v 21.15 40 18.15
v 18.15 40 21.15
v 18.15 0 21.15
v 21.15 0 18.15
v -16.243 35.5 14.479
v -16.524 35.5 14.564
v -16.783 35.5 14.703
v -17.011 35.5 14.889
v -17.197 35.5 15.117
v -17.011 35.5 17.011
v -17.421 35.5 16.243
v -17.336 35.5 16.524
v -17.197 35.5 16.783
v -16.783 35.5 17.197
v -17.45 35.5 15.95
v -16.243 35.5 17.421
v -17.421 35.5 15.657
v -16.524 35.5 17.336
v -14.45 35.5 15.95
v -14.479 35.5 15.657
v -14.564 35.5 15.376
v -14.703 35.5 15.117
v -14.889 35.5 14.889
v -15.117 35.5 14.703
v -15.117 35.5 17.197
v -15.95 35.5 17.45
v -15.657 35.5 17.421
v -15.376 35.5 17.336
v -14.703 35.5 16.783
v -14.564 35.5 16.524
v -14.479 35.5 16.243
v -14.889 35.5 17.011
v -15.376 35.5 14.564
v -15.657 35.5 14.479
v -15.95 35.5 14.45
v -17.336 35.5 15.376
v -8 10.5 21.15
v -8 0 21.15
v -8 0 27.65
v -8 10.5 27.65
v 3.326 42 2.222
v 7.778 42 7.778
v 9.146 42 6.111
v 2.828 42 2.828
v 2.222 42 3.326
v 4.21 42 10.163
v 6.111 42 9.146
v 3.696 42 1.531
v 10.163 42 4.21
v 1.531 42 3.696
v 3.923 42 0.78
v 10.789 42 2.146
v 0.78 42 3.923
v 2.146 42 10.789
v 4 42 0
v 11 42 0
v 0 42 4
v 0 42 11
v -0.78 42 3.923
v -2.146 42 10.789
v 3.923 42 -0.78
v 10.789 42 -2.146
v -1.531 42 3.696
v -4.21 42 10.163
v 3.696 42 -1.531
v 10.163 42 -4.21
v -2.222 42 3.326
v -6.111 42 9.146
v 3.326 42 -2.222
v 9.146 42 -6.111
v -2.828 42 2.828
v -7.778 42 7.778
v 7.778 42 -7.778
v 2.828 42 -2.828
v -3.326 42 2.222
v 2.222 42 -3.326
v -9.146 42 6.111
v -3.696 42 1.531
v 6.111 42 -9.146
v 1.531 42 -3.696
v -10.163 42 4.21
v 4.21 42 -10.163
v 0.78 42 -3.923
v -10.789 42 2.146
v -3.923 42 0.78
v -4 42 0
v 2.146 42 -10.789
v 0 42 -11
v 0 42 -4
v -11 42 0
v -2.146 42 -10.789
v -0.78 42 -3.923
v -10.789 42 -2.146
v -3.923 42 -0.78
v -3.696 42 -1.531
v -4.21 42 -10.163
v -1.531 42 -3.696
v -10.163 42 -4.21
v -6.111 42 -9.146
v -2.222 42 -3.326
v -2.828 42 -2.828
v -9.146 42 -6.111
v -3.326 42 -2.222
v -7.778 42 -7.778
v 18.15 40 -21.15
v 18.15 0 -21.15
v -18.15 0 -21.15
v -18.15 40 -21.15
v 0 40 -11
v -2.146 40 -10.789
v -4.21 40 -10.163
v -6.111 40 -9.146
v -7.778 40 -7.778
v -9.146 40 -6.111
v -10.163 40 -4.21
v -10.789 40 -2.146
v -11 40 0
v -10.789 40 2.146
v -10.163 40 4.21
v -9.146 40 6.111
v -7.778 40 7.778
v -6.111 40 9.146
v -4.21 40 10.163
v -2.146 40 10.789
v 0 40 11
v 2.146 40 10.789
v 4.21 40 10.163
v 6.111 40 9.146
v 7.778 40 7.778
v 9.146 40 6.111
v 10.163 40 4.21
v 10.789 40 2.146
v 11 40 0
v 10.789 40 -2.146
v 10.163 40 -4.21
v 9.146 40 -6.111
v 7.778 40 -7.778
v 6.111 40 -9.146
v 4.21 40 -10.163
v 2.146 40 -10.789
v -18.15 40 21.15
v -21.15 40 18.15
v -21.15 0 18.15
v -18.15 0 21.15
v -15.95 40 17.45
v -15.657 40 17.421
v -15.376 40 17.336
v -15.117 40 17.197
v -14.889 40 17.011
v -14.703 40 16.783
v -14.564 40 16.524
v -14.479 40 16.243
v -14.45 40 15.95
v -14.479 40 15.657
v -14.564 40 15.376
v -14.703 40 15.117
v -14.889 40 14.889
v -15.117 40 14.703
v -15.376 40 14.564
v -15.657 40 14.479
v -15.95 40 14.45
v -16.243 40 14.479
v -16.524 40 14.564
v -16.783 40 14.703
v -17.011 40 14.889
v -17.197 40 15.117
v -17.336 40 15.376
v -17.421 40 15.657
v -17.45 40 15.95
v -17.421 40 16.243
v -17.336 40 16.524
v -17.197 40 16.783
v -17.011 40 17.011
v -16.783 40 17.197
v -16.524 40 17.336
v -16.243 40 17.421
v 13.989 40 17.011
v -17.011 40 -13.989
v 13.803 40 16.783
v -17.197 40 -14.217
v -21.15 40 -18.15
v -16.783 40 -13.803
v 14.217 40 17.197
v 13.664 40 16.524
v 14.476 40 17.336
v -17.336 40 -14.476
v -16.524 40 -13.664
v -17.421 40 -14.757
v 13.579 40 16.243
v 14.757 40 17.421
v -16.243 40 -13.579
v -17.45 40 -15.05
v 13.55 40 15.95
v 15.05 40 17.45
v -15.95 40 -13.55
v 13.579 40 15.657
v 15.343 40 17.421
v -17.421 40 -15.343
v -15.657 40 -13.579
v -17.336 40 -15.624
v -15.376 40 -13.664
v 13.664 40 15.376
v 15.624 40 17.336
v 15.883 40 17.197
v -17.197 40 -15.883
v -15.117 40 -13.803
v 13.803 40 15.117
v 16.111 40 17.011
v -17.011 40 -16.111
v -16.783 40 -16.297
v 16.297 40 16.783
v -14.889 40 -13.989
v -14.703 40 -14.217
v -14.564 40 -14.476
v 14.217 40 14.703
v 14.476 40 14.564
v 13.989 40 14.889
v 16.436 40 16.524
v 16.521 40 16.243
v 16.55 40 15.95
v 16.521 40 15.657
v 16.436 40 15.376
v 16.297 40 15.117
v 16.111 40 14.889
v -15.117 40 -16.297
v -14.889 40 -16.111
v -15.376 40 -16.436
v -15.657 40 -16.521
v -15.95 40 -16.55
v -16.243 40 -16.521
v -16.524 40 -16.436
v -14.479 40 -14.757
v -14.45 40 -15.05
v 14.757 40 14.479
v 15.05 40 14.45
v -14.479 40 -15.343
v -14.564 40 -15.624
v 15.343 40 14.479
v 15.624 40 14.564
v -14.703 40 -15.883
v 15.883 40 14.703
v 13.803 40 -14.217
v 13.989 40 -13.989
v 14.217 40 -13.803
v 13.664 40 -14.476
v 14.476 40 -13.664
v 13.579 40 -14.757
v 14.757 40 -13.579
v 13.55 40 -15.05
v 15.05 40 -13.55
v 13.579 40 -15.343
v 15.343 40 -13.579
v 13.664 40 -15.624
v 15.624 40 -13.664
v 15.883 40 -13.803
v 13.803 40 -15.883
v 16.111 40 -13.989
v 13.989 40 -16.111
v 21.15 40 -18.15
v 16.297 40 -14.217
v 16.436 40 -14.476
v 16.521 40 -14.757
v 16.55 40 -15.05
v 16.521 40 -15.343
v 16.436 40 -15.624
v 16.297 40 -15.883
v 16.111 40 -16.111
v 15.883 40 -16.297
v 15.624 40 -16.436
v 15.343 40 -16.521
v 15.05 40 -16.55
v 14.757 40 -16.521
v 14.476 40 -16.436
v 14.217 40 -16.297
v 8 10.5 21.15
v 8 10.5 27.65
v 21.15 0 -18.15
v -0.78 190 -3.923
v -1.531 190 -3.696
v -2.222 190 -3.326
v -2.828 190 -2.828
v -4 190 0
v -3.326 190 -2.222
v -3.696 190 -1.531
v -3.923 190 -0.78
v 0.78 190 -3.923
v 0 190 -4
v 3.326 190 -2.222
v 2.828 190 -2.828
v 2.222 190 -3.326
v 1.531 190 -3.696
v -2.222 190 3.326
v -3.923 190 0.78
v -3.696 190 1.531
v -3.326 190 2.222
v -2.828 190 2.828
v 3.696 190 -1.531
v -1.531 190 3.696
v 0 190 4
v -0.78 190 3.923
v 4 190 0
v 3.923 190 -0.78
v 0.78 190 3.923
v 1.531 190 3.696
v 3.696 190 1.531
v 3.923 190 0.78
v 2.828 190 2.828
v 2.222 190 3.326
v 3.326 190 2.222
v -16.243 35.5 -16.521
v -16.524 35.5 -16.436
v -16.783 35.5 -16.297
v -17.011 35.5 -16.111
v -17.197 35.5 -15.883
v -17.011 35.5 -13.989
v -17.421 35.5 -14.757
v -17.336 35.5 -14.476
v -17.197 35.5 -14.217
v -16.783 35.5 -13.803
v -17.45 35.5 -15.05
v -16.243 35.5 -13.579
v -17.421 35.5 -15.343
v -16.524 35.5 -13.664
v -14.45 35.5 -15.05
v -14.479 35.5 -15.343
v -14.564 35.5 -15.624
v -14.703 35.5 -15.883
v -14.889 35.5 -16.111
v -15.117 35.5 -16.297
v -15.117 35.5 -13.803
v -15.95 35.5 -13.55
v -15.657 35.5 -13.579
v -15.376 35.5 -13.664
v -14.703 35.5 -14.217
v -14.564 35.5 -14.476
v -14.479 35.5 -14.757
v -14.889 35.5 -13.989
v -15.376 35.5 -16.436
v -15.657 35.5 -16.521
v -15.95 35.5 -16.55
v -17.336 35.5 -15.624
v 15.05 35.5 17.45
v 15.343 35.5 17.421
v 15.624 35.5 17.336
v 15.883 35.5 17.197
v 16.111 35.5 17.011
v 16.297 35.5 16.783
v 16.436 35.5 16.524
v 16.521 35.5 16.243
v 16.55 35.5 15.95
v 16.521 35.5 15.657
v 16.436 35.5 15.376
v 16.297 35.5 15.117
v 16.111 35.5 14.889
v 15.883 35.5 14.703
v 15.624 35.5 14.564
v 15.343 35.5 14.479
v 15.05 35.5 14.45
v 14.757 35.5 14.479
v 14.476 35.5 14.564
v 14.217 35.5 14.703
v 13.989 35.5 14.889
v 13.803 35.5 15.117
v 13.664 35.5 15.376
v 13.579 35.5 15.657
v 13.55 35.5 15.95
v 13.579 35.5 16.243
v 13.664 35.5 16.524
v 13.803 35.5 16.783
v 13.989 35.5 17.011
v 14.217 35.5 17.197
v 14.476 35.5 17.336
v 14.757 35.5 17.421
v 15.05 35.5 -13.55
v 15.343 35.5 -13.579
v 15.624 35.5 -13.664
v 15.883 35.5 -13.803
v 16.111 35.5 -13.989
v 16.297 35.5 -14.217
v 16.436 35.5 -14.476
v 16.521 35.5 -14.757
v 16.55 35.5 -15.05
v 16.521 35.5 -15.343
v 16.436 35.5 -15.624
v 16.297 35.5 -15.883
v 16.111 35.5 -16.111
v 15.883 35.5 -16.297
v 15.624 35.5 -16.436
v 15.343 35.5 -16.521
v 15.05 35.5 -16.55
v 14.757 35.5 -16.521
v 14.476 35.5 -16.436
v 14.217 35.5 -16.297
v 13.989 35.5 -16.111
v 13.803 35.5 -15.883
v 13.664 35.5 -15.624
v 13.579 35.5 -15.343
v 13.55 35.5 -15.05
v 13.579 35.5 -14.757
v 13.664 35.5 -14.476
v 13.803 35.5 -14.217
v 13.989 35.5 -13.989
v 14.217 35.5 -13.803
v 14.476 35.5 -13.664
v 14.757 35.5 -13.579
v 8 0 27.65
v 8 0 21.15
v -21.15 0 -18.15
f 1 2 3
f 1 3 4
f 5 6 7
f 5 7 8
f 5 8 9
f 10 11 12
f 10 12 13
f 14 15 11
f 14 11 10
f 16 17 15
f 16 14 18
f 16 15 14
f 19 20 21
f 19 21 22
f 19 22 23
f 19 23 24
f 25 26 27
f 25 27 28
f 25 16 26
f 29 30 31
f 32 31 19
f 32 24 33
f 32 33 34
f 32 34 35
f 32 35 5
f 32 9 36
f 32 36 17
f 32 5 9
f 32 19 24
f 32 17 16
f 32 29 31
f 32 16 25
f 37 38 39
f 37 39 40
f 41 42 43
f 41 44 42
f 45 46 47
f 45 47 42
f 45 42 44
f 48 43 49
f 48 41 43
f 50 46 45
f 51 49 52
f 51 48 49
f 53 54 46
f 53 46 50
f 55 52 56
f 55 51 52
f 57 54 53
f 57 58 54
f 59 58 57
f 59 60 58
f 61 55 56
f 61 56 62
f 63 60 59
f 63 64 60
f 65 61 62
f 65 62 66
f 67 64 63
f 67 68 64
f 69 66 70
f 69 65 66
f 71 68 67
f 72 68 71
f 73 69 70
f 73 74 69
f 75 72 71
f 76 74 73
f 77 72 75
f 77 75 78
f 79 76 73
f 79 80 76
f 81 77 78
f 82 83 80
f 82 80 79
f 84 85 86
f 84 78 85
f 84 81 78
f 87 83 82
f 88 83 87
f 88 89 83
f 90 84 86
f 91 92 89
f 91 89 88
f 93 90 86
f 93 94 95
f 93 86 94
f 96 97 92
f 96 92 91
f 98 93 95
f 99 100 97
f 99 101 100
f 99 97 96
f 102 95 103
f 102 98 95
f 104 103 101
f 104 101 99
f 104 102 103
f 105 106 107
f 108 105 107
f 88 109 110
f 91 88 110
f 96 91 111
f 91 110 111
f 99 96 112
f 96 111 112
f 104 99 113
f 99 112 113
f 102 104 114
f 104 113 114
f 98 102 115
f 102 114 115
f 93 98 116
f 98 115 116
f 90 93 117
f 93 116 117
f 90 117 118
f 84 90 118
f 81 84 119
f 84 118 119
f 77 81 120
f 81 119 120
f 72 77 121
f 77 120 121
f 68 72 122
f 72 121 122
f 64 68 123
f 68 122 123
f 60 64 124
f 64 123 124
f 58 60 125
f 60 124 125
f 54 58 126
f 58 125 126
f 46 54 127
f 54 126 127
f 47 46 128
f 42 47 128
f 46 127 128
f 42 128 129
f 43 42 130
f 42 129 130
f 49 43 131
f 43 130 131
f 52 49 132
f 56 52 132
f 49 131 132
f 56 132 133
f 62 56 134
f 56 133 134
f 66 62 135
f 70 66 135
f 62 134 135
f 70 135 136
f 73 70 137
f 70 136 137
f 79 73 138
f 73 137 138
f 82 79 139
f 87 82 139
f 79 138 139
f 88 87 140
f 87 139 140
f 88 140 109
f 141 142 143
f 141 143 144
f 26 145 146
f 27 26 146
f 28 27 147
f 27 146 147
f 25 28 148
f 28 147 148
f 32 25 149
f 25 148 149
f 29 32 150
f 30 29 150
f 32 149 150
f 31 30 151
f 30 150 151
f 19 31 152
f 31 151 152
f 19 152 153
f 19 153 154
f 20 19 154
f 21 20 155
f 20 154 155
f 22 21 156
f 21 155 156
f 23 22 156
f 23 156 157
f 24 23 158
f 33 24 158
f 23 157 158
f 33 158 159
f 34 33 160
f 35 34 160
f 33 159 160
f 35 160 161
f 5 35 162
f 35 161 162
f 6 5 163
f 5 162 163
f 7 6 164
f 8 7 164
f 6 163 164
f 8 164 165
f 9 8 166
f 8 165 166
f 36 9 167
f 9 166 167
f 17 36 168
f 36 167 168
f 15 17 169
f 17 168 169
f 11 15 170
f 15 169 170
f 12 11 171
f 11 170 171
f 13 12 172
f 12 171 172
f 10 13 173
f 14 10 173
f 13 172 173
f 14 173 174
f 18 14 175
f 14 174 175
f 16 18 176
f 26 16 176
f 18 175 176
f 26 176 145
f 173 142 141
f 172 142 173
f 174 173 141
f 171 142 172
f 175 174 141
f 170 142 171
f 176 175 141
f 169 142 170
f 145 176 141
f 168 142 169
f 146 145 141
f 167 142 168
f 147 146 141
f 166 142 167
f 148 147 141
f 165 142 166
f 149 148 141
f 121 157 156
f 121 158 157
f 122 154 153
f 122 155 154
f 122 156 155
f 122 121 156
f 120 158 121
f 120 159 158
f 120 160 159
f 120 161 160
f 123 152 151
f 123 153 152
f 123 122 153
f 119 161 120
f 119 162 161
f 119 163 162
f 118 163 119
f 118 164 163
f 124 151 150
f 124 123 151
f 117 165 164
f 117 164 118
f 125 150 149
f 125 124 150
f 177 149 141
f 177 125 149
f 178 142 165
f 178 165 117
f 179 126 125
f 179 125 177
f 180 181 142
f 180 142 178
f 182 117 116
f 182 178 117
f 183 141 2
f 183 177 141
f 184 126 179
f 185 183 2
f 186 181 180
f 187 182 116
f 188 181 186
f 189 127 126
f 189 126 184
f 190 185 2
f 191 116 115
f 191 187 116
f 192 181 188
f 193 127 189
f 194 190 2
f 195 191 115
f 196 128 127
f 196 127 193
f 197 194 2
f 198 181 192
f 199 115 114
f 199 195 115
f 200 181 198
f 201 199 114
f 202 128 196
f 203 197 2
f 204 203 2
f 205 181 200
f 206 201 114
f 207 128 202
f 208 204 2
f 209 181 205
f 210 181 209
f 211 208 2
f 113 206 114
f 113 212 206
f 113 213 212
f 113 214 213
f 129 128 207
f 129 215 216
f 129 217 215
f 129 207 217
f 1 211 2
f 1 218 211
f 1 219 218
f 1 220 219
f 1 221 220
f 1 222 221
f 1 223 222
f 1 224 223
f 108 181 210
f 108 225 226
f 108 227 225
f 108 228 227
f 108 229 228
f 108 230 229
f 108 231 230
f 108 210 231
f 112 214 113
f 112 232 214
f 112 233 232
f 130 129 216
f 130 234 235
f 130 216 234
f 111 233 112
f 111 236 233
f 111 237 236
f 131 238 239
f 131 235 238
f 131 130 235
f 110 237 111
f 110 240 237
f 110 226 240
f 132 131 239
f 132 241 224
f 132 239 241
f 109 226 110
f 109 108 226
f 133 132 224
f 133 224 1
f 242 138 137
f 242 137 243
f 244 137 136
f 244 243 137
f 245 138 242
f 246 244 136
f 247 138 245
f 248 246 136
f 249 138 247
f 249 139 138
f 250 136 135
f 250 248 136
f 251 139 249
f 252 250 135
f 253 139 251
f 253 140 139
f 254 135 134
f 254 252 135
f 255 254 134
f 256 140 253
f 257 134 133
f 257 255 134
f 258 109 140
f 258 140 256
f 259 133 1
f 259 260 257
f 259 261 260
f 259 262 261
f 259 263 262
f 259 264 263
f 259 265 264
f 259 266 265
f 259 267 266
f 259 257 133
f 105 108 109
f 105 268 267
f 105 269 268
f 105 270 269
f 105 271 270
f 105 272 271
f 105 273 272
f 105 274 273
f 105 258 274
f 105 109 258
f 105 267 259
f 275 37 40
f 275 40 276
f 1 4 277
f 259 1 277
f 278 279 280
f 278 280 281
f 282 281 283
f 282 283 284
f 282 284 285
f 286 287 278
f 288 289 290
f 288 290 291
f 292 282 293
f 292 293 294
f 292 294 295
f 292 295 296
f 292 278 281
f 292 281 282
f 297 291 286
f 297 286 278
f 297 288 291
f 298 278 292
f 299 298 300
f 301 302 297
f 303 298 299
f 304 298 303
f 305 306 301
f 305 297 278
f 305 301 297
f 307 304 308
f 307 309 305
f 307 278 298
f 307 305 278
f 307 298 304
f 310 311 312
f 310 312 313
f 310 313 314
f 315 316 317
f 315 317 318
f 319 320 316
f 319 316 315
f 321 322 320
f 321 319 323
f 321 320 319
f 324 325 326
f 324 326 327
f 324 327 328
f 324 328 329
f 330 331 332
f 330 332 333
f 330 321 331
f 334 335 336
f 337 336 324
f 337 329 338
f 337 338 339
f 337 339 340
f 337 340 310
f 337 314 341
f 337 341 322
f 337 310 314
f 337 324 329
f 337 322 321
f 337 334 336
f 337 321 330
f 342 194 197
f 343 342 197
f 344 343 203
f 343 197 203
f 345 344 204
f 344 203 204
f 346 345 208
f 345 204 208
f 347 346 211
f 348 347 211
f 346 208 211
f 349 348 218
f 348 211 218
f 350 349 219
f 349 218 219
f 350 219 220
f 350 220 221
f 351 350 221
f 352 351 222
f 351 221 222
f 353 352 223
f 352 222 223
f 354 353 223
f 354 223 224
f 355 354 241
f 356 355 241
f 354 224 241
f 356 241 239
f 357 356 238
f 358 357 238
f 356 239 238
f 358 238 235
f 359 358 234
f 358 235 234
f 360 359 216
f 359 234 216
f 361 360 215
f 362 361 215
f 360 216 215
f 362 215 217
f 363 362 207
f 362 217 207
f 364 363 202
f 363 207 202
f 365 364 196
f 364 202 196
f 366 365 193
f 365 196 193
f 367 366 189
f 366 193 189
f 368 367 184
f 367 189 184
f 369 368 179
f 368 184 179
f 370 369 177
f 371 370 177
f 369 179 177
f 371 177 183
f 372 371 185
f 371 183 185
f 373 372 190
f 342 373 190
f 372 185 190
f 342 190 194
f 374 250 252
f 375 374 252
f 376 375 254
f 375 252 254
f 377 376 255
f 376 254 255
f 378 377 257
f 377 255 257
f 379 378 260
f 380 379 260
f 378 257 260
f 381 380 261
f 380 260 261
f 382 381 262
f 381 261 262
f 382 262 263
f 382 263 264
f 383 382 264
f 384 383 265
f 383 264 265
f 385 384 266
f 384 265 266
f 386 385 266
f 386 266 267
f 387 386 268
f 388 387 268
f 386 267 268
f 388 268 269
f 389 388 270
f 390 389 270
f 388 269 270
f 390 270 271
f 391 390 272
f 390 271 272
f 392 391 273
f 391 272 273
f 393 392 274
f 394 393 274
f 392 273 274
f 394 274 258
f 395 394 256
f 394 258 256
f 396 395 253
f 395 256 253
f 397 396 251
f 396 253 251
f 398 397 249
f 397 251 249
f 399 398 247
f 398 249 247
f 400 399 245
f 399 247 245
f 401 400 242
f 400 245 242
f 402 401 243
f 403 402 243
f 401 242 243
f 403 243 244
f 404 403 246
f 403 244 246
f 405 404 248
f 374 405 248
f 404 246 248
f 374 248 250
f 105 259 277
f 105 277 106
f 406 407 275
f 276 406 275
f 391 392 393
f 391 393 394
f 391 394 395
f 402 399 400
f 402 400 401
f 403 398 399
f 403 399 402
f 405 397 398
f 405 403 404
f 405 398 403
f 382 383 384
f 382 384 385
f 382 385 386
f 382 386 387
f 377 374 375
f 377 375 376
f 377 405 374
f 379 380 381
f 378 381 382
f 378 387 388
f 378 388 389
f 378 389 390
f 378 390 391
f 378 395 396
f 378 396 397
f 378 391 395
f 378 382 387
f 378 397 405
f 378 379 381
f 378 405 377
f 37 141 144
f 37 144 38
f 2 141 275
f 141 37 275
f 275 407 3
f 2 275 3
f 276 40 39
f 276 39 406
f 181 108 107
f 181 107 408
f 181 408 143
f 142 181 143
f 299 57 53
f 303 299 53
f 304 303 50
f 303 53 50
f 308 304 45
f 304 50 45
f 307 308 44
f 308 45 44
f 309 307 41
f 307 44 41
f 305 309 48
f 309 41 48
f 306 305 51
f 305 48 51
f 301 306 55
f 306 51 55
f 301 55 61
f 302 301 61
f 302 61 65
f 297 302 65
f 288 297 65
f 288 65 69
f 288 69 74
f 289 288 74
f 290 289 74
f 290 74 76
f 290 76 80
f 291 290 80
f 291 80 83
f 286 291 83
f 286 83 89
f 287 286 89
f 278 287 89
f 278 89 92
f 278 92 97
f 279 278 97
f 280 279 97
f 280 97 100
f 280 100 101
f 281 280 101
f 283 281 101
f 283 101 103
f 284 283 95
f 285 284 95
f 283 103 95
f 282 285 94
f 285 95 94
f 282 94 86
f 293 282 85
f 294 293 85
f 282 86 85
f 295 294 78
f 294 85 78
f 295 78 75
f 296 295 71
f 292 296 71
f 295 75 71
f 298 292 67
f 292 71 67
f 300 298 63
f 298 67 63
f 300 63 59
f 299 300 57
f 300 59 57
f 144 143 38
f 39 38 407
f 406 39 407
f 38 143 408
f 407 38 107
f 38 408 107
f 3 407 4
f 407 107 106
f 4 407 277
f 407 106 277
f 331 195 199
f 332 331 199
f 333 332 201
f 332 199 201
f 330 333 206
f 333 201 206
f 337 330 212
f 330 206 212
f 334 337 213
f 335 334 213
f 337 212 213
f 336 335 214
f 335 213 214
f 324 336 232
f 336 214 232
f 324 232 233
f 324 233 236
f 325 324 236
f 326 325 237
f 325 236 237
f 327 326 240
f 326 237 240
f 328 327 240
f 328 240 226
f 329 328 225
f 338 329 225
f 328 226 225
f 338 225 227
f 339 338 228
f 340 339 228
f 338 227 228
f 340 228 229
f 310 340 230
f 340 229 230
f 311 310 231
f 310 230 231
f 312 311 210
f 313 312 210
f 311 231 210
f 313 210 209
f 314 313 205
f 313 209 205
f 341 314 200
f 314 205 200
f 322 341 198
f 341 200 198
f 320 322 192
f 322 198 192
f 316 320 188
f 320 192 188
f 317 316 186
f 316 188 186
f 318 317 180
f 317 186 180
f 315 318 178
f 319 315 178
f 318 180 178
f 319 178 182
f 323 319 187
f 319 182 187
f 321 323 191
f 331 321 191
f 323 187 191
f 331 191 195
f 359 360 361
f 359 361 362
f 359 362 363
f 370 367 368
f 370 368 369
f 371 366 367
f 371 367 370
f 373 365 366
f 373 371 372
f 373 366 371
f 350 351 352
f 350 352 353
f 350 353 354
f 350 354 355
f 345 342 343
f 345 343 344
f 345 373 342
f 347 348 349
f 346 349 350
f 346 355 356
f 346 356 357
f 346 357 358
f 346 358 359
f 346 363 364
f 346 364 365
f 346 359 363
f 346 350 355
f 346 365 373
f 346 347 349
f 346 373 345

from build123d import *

# Parameters (mm, degrees)
SALIENTE_EXTRUIR1_DEPTH = 40
CROQUIS2_R              = 1.5
CORTAR_EXTRUIR2_DEPTH   = 4.5
CROQUIS3_R              = 11
CROQUIS3_R_2            = 4
SALIENTE_EXTRUIR3_DEPTH = 2
CROQUIS8_R              = 4
SALIENTE_EXTRUIR4_DEPTH = 150
CROQUIS9_W              = 16
CROQUIS9_H              = 10.5
SALIENTE_EXTRUIR6_DEPTH = 6.5


with BuildPart() as part:
    # Croquis1 → Saliente-Extruir1 (new body)
    with BuildSketch(Plane(origin=(0, 0, 0), x_dir=(1, 0, 0), z_dir=(0, 1, 0))):
        Polygon((-18.15, -21.15), (18.15, -21.15), (21.15, -18.15), (21.15, 18.15), (18.15, 21.15), (-18.15, 21.15), (-21.15, 18.15), (-21.15, -18.15), align=None)
    extrude(amount=SALIENTE_EXTRUIR1_DEPTH)

    # Croquis2 → Cortar-Extruir2 (cut)
    with BuildSketch(Plane(origin=(0, 40, 0), x_dir=(1, 0, 0), z_dir=(0, 1, 0))):
        with Locations(Location((15.05, 15.05, 0), (0, 0, 270))):
            Circle(CROQUIS2_R)
        with Locations(Location((-15.95, 15.05, 0), (0, 0, 270))):
            Circle(CROQUIS2_R)
        with Locations(Location((-15.95, -15.95, 0), (0, 0, 270))):
            Circle(CROQUIS2_R)
        with Locations(Location((15.05, -15.95, 0), (0, 0, 270))):
            Circle(CROQUIS2_R)
    extrude(amount=-CORTAR_EXTRUIR2_DEPTH, mode=Mode.SUBTRACT)

    # Croquis3 → Saliente-Extruir3 (add)
    with BuildSketch(Plane(origin=(0, 40, 0), x_dir=(1, 0, 0), z_dir=(0, 1, 0))):
        with Locations(Location((0, 0, 0), (0, 0, 90))):
            Circle(CROQUIS3_R)
        with Locations(Location((0, 0, 0), (0, 0, 270))):
            Circle(CROQUIS3_R_2, mode=Mode.SUBTRACT)
    extrude(amount=SALIENTE_EXTRUIR3_DEPTH)

    # Croquis8 → Saliente-Extruir4 (add)
    with BuildSketch(Plane(origin=(0, 40, 0), x_dir=(1, 0, 0), z_dir=(0, 1, 0))):
        with Locations(Location((0, 0, 0), (0, 0, 270))):
            Circle(CROQUIS8_R)
    extrude(amount=SALIENTE_EXTRUIR4_DEPTH)

    # Croquis9 → Saliente-Extruir6 (add)
    with BuildSketch(Plane.XY.offset(21.15)):
        with Locations((0, 5.25)):
            Rectangle(CROQUIS9_W, CROQUIS9_H)
    extrude(amount=SALIENTE_EXTRUIR6_DEPTH)


solid = part.part
